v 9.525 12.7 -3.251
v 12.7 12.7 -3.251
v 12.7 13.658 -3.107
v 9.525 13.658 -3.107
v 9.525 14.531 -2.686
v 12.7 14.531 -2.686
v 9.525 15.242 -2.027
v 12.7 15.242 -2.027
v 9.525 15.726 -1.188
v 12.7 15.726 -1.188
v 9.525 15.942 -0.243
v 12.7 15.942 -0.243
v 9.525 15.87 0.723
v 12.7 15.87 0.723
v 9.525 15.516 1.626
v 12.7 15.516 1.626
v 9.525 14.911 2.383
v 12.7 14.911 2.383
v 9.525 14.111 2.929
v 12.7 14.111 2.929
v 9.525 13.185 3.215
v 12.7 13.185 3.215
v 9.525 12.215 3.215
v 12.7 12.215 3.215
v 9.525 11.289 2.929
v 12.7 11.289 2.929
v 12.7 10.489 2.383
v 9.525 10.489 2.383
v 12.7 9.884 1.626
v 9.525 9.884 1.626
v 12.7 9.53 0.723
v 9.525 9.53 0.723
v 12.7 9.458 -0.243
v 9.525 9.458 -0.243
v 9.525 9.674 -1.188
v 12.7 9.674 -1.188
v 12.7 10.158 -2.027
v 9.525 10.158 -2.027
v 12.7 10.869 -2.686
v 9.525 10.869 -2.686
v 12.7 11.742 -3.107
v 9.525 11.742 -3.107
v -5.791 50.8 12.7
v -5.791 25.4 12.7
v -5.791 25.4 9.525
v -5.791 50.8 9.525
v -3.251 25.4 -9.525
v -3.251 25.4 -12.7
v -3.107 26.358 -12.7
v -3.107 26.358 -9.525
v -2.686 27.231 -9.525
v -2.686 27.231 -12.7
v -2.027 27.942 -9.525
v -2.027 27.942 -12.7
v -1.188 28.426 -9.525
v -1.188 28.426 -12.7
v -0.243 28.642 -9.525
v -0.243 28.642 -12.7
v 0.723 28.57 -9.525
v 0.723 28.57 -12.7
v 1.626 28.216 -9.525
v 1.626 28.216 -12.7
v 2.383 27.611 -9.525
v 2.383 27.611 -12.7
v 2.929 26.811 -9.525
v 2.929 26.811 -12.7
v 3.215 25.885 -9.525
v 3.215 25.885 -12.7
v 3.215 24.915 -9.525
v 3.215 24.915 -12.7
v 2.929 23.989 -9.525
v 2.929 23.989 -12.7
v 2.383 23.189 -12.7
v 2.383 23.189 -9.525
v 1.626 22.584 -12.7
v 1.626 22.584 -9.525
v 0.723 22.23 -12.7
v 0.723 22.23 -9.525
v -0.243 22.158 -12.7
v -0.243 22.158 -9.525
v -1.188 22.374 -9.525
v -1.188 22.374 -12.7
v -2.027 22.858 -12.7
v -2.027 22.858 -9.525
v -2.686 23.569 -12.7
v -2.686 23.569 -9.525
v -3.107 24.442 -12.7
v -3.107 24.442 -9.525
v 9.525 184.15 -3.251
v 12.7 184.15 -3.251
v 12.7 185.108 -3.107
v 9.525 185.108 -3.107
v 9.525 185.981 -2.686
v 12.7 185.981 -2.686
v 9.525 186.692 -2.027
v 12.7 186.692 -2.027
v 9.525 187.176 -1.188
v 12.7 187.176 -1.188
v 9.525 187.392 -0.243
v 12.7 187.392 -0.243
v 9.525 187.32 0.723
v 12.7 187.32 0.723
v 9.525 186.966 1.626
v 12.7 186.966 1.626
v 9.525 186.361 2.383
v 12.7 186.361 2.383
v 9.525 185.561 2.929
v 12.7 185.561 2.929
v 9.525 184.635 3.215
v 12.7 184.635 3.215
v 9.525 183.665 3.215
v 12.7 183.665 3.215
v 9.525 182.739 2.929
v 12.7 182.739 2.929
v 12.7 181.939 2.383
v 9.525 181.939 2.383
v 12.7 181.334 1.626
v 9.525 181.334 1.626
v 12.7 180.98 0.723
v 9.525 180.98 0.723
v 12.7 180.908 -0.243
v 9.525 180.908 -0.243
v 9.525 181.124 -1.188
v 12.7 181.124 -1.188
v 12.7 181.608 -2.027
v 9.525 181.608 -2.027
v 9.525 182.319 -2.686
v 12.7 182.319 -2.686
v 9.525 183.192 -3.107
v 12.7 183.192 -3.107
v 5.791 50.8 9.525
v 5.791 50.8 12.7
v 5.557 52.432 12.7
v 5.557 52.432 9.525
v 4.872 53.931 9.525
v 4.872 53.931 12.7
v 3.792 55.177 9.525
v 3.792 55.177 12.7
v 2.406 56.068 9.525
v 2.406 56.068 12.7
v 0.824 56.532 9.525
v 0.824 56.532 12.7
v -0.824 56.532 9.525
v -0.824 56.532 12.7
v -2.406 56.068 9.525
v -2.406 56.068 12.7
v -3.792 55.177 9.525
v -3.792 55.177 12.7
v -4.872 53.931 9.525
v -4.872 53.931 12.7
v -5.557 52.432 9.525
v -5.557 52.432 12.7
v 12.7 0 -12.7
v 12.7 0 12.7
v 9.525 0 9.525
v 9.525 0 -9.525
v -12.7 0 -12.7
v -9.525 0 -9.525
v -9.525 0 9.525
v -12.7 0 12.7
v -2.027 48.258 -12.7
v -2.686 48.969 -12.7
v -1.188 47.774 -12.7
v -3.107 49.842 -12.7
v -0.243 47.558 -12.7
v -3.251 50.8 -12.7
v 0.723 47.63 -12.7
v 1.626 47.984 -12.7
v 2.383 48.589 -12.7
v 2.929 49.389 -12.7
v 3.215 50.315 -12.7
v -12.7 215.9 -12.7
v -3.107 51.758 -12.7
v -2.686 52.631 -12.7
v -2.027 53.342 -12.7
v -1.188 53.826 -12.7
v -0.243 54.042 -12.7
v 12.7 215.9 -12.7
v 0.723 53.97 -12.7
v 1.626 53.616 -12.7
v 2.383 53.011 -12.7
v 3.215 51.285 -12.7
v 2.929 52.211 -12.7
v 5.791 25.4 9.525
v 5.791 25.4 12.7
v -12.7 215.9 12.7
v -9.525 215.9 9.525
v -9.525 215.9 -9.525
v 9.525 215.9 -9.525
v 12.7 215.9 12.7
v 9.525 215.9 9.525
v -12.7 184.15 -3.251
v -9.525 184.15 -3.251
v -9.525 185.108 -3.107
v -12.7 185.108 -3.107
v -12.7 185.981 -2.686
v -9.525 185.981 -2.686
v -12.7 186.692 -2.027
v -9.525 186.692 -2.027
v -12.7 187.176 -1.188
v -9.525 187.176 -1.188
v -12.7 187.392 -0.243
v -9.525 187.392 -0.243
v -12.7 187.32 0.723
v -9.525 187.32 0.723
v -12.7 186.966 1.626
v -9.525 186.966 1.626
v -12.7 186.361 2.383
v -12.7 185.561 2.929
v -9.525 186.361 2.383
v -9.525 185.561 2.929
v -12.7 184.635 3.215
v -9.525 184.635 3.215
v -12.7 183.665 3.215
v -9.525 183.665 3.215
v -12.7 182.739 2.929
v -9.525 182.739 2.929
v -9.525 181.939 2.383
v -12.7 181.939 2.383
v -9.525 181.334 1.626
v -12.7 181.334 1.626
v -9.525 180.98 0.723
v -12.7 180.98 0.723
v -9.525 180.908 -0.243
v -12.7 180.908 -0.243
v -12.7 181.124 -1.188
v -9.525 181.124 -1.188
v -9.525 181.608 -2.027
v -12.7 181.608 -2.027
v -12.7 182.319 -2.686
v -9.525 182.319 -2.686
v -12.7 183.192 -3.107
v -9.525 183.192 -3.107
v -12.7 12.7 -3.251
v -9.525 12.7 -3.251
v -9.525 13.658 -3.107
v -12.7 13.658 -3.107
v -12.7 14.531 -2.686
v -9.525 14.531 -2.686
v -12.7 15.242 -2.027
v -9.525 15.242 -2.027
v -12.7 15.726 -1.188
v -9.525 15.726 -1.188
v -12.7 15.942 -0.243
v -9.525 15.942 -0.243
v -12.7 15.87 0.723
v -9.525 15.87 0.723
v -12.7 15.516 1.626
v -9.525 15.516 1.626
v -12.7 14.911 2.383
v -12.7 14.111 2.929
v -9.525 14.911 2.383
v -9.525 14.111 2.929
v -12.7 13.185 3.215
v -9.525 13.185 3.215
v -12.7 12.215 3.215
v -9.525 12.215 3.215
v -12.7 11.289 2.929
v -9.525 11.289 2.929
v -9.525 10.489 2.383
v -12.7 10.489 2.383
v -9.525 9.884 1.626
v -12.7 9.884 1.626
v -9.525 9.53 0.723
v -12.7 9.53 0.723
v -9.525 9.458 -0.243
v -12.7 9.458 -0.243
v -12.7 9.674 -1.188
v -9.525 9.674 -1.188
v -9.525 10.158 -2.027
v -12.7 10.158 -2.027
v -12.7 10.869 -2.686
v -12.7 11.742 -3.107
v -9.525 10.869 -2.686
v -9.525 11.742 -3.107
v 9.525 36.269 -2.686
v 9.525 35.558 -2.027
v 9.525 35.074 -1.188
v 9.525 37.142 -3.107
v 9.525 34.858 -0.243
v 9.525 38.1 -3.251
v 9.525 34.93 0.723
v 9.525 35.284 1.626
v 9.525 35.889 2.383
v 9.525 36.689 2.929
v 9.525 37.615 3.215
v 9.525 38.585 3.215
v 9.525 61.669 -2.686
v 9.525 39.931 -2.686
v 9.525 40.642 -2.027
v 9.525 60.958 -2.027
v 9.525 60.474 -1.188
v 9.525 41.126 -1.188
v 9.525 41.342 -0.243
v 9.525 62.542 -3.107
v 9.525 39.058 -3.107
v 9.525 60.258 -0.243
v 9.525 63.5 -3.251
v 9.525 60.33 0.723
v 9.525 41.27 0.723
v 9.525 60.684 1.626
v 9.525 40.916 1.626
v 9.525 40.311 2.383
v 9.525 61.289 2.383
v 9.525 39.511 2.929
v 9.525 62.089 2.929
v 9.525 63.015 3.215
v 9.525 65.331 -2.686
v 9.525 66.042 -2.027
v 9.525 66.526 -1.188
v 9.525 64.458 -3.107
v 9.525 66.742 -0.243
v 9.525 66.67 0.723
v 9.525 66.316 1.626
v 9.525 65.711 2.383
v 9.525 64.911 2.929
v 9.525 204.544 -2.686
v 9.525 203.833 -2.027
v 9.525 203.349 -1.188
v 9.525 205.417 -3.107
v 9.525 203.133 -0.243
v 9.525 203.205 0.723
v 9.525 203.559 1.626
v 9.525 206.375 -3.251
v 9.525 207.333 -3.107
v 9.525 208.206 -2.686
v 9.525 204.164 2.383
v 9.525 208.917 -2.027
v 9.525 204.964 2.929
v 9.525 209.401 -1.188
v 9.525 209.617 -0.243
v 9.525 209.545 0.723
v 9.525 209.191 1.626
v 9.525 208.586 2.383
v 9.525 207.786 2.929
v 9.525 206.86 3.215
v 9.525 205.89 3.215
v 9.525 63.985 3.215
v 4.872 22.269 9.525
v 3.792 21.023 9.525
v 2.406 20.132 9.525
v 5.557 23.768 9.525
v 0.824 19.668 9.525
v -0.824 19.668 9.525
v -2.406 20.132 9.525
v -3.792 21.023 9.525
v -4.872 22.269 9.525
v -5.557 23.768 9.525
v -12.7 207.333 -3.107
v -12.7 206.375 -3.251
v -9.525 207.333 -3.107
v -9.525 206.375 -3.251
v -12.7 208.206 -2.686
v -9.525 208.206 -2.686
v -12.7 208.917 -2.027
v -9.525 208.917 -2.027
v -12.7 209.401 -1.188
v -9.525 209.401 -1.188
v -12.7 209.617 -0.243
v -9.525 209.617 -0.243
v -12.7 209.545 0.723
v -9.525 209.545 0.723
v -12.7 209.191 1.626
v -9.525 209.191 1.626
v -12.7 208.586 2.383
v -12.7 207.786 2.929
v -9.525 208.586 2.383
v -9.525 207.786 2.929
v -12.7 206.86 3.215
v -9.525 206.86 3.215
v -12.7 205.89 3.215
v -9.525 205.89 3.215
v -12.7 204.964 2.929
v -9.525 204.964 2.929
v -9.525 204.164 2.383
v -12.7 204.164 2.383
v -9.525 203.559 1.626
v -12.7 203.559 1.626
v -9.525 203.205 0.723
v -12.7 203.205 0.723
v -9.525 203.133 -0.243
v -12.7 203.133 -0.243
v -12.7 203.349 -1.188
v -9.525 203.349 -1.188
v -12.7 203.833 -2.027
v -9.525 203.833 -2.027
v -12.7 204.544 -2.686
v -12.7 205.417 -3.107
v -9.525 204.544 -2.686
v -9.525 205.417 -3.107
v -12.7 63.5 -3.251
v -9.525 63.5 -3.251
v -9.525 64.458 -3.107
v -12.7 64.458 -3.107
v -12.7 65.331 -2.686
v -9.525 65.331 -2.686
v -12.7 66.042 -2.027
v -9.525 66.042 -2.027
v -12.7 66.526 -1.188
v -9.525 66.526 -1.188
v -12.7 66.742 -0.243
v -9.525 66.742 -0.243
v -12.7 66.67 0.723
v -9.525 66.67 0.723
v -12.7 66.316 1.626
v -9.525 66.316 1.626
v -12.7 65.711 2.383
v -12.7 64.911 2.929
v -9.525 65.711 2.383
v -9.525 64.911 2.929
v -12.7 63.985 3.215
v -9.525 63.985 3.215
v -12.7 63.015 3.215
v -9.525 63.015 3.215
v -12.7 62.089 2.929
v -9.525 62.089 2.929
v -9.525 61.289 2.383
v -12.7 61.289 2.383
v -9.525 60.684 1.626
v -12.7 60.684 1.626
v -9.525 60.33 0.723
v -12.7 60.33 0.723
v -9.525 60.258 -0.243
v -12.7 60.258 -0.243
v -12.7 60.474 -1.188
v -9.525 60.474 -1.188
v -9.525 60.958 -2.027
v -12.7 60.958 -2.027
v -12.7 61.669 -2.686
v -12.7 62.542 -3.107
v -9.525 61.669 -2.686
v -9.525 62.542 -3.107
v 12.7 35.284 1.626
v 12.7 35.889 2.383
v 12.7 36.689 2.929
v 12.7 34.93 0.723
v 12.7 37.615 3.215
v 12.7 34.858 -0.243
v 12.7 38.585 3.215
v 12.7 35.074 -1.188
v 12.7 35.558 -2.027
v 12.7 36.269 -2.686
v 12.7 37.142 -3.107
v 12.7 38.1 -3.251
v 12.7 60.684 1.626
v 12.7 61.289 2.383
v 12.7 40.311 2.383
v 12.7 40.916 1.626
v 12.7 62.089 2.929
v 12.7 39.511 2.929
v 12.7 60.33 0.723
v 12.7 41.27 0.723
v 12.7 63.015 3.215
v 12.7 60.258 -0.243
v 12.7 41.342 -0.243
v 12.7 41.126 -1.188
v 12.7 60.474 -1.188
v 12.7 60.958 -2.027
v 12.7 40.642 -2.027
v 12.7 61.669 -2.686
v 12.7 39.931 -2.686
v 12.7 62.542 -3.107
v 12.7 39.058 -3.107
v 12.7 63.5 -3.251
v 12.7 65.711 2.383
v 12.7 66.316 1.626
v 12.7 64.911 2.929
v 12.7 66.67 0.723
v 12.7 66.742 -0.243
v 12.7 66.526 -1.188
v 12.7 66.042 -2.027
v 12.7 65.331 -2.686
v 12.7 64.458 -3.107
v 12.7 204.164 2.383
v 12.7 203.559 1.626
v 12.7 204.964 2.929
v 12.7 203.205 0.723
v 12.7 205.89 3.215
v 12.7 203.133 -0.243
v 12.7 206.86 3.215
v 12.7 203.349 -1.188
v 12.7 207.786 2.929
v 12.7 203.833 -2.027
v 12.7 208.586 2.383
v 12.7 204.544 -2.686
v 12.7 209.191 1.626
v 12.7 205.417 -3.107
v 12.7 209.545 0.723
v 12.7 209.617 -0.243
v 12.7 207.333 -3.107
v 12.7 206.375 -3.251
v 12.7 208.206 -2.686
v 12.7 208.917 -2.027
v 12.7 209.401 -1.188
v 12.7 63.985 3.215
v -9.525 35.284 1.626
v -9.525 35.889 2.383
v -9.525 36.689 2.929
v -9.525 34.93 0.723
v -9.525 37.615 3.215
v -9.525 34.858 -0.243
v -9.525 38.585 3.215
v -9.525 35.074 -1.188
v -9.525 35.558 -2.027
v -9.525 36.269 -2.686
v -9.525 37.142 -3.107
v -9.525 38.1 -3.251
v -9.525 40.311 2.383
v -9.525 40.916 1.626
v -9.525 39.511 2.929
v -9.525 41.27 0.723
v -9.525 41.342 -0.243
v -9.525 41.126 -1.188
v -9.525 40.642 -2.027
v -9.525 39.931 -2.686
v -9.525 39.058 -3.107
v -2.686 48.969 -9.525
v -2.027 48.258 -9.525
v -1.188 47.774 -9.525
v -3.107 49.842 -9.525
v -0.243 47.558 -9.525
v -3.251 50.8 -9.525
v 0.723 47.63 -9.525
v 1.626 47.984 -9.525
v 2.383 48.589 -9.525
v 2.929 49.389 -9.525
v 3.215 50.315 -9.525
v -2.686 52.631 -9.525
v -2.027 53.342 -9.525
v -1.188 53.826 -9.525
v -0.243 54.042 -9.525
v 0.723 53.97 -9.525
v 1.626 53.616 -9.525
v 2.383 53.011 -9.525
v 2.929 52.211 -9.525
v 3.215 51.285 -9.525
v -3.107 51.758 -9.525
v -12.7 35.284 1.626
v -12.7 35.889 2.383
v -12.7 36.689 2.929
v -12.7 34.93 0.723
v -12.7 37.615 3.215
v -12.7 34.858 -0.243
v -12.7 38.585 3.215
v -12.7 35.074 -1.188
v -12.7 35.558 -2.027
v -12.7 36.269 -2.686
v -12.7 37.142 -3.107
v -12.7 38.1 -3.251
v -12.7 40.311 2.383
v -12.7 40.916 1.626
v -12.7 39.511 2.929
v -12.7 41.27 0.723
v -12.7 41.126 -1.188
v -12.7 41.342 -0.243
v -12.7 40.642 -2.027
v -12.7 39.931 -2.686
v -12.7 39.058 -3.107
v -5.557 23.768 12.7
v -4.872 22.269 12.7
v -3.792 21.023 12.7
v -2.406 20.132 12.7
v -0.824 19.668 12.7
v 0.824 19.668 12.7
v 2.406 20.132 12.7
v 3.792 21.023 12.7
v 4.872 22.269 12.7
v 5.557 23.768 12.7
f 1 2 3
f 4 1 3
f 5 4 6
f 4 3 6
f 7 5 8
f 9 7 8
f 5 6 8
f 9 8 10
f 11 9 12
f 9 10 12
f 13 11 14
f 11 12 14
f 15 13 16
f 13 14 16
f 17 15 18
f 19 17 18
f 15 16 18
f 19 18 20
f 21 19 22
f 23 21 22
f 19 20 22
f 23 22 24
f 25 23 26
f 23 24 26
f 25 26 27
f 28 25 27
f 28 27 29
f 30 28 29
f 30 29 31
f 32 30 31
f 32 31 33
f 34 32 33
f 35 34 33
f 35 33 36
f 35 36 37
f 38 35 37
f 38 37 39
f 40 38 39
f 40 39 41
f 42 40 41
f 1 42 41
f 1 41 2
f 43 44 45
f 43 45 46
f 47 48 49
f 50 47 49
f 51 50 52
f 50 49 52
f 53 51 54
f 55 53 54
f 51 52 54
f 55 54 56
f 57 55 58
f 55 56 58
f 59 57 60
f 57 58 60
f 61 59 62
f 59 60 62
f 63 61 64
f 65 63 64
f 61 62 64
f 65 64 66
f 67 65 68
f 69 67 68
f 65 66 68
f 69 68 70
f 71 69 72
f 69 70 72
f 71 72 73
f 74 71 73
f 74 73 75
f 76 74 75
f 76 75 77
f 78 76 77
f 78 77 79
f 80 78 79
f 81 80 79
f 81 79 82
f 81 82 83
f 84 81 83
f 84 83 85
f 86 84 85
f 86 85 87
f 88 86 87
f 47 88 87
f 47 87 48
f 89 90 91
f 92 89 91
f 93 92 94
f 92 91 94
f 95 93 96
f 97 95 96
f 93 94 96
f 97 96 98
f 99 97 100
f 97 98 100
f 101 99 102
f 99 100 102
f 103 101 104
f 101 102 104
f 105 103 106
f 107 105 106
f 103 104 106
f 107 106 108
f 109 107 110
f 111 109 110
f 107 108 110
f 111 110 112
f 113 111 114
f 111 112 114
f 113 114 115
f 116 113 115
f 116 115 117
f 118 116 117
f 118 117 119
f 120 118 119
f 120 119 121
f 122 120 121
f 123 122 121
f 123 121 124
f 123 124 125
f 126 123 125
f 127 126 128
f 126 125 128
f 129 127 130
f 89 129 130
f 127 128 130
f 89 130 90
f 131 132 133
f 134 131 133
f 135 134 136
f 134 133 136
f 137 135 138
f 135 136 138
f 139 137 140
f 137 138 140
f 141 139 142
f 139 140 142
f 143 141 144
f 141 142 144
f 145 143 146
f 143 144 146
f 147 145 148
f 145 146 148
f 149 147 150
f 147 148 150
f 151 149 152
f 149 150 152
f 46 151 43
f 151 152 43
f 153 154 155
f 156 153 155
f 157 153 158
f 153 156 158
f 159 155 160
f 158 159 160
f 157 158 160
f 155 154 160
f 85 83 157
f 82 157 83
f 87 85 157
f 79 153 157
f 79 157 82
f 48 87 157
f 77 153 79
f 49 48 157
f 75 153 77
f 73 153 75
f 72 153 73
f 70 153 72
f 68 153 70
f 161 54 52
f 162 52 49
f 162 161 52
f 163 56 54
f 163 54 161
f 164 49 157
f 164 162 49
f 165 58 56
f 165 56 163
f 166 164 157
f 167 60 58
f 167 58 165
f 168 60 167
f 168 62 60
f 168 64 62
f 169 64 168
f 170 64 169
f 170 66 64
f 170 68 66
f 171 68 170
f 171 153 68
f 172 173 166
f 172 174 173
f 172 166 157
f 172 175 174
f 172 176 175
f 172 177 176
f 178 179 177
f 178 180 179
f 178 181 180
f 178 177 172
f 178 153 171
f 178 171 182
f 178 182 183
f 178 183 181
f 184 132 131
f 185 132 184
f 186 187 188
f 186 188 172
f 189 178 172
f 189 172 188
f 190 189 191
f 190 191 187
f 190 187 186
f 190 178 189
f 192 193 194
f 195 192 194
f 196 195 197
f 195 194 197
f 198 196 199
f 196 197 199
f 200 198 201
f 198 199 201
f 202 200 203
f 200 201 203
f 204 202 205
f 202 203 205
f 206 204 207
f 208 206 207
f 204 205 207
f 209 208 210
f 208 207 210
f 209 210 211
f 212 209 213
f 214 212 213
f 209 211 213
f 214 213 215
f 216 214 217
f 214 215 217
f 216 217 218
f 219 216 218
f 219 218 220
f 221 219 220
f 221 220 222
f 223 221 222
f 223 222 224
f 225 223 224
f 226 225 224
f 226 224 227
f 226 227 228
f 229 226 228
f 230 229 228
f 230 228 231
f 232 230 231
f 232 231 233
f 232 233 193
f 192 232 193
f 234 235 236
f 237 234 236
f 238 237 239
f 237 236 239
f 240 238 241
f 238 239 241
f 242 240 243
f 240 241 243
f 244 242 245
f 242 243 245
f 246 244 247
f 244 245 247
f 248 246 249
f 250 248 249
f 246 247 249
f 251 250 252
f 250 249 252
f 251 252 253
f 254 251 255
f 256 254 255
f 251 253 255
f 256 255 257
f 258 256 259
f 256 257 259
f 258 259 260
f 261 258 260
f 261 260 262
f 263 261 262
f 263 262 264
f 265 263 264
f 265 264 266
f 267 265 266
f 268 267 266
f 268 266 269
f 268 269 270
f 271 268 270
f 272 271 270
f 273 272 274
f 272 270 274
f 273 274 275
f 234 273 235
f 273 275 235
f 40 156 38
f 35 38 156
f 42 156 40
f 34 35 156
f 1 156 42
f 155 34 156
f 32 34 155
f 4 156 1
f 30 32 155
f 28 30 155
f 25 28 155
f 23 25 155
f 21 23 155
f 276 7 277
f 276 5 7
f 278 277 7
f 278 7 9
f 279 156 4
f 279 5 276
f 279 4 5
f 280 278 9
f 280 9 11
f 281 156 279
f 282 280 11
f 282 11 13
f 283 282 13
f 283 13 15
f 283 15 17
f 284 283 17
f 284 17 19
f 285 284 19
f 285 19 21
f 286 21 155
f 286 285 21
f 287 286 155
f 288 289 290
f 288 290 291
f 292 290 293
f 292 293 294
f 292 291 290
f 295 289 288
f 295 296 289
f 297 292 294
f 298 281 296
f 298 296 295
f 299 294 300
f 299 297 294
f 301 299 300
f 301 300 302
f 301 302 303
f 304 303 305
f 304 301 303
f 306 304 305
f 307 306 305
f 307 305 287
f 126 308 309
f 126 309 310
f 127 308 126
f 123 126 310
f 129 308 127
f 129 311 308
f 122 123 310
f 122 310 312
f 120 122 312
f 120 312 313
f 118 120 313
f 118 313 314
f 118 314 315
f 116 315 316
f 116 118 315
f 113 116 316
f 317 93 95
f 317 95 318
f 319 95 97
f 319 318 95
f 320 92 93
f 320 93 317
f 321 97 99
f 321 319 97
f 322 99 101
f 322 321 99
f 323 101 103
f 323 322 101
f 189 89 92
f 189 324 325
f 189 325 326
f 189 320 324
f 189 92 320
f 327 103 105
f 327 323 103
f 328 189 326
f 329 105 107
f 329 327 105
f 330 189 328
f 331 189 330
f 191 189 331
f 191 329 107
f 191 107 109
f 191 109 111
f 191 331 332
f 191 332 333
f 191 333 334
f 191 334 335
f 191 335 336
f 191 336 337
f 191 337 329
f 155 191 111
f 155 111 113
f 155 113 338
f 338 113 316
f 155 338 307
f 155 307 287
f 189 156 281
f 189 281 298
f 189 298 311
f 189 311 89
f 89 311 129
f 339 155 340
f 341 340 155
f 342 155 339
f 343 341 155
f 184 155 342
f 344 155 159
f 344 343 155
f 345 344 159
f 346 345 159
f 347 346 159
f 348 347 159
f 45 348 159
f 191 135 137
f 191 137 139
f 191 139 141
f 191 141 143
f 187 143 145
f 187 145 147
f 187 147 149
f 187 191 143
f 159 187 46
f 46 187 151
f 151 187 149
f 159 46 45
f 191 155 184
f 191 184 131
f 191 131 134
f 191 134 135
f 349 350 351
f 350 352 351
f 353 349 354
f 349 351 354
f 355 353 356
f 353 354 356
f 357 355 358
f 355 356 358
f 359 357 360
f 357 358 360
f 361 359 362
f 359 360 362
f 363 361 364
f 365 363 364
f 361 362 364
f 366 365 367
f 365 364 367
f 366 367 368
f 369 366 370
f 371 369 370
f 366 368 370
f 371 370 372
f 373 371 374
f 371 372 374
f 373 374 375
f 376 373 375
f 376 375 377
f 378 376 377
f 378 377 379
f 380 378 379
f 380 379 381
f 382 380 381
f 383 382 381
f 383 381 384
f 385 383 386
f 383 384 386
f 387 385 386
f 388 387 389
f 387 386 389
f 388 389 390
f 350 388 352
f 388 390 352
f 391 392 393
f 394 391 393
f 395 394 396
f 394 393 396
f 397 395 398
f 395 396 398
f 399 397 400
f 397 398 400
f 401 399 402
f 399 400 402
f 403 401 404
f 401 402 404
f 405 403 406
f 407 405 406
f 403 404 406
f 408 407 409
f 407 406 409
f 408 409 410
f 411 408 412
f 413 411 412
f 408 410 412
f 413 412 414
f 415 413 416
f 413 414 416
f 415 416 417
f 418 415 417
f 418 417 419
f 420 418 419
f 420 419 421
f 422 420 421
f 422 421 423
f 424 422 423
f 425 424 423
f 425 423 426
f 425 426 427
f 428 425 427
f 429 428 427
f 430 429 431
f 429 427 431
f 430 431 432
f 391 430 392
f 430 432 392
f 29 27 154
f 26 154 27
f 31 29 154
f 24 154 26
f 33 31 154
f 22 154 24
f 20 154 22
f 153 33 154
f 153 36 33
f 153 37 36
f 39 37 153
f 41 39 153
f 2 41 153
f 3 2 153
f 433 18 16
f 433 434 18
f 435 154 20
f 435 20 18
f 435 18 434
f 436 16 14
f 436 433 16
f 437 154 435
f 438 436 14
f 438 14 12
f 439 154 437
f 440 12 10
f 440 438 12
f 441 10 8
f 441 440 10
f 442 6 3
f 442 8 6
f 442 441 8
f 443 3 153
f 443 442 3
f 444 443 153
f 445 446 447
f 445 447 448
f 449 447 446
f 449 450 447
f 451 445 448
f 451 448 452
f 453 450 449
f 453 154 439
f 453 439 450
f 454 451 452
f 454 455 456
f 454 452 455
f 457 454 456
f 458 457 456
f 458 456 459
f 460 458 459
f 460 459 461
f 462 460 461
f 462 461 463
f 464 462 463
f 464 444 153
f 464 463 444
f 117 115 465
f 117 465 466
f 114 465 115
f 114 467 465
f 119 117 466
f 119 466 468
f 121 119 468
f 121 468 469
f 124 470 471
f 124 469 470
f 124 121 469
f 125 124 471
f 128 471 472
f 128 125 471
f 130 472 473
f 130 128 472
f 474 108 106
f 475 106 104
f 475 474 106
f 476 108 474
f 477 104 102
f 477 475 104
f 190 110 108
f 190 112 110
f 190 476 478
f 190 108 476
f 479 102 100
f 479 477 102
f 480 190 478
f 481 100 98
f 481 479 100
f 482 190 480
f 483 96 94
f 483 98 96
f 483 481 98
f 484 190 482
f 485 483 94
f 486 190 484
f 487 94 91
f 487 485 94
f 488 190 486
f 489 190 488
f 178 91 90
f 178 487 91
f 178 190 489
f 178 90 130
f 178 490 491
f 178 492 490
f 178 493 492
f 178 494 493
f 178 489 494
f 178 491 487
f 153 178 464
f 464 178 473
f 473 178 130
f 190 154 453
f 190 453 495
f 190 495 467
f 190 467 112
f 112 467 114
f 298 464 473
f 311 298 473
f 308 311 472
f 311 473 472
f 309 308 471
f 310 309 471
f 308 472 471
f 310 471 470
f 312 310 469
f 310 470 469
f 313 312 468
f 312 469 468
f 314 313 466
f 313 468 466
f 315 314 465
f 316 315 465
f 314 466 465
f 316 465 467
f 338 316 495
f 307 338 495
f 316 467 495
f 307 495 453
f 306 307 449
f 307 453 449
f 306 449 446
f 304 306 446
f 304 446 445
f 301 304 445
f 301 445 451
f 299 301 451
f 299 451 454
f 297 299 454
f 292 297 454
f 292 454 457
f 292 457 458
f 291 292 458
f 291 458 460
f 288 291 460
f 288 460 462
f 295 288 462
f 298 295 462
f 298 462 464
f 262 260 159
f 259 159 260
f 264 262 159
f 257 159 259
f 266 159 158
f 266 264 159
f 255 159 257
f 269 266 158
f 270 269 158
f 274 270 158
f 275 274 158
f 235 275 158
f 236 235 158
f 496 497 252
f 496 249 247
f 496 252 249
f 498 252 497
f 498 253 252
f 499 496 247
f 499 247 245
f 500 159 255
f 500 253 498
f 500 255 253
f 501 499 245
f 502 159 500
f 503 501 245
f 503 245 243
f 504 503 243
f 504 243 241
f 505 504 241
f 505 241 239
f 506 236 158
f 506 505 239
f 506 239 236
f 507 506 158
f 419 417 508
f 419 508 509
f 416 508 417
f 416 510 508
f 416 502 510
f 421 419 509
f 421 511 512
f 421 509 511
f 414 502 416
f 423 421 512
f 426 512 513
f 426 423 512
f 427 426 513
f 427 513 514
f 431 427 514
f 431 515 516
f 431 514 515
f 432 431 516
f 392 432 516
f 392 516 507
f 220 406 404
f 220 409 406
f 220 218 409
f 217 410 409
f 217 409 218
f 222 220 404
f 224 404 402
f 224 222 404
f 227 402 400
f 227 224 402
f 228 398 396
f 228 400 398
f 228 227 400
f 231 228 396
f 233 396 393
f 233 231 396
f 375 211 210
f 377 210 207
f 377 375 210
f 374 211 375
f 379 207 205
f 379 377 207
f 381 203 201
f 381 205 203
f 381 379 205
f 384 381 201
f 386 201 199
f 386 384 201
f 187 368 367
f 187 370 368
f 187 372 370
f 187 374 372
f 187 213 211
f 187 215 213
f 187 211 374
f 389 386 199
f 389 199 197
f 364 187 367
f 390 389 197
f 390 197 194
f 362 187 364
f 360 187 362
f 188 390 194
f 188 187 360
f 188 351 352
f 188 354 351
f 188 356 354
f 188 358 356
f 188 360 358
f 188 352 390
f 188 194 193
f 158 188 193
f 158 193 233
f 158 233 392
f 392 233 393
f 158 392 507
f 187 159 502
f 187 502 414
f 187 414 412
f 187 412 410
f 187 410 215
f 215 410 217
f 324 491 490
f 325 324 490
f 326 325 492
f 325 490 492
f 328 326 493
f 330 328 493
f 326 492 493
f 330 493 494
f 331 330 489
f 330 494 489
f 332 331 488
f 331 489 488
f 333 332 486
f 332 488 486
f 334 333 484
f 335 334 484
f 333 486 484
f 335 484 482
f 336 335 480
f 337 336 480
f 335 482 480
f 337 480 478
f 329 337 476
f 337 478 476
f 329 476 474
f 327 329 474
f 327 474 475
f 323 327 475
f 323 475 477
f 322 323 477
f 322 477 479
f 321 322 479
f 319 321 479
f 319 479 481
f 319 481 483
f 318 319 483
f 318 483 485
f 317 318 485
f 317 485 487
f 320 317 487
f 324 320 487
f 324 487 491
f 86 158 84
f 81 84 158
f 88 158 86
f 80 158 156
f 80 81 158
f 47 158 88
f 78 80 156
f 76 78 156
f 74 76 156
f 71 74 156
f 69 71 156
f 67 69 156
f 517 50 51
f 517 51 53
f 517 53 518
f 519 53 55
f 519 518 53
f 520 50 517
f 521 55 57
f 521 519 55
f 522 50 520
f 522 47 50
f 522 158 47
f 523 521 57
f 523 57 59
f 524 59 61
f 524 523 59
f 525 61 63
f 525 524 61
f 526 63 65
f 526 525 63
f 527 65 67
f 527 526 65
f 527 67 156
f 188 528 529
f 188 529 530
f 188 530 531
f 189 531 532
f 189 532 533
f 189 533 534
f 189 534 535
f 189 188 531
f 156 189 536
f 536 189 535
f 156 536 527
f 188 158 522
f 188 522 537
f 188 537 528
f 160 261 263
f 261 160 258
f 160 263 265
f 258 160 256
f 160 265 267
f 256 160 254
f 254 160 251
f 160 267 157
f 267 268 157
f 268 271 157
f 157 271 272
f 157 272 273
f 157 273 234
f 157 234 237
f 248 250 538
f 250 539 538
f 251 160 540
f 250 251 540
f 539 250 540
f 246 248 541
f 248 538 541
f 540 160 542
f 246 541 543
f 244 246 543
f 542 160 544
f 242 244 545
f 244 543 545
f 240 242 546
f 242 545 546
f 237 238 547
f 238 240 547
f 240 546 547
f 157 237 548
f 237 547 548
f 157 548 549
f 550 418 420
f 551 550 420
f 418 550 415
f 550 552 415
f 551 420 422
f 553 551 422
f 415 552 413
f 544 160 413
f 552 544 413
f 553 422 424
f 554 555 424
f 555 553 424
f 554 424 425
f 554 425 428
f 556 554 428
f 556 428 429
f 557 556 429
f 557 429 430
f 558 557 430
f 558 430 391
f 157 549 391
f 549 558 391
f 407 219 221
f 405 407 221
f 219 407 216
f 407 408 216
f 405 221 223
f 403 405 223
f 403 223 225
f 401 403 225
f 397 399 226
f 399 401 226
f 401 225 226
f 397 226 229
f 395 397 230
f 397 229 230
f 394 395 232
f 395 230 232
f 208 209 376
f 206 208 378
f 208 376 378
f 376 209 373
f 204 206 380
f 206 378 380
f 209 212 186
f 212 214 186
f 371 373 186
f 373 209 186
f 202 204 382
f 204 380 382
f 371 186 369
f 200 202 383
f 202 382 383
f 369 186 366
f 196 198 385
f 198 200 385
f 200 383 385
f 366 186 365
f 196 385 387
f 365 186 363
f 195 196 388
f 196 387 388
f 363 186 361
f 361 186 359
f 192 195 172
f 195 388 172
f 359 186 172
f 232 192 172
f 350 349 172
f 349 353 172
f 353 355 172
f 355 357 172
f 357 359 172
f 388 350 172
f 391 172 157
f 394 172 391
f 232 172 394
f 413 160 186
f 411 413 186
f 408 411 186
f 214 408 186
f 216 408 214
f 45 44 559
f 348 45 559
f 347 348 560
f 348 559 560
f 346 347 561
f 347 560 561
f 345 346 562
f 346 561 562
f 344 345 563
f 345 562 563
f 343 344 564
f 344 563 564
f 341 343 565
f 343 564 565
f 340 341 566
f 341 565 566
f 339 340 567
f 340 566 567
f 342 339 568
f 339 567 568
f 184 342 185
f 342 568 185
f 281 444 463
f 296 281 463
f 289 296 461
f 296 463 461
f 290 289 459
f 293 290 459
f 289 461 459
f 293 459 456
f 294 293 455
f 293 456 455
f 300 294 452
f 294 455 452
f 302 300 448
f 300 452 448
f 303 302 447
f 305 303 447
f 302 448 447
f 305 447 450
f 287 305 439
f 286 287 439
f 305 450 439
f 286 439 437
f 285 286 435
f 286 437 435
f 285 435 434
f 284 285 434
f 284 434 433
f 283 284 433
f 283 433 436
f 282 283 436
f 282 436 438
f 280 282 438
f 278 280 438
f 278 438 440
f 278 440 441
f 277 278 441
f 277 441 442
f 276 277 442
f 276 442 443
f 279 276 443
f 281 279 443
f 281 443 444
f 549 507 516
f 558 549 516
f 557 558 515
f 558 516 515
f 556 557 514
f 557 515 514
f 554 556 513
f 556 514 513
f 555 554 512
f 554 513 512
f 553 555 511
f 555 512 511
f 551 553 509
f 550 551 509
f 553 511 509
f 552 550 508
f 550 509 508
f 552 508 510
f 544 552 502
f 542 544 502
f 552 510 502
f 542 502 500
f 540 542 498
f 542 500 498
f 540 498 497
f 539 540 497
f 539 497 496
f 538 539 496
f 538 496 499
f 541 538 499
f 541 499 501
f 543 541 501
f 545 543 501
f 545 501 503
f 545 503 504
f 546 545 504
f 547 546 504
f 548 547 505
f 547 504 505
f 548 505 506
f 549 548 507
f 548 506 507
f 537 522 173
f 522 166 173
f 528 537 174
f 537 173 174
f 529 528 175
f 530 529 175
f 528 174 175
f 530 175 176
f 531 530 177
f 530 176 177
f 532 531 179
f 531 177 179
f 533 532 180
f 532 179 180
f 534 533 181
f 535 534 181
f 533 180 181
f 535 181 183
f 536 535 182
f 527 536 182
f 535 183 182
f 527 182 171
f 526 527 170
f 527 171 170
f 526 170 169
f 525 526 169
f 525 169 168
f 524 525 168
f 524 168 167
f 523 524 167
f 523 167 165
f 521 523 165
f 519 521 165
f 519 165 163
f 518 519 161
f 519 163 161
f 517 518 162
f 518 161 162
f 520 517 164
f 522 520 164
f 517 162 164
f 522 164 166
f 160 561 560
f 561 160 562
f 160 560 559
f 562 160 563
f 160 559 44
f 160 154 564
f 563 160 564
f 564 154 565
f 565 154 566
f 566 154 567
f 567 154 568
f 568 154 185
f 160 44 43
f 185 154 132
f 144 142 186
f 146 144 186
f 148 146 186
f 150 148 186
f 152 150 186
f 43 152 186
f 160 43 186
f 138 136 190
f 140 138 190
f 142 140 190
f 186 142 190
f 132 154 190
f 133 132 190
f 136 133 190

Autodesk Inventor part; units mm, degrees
ref_plane "YZ Plane" through (0, 0, 0) normal (1, 0, 0) x (0, 1, 0)
ref_plane "XZ Plane" through (0, 0, 0) normal (0, 1, 0) x (-1, 0, 0)
ref_plane "XY Plane" through (0, 0, 0) normal (0, 0, 1) x (1, 0, 0)
sketch "Sketch1" plane through (0, 0, 0) normal (0, 1, 0) x (-1, 0, 0)
  line L0 (-12.7, -12.7) -> (12.7, -12.7)
  line L1 (12.7, -12.7) -> (12.7, 12.7)
  line L2 (12.7, 12.7) -> (-12.7, 12.7)
  line L3 (-12.7, 12.7) -> (-12.7, -12.7)
  line L4 (-12.7, -12.7) -> (12.7, 12.7) construction
  line L5 (12.7, -12.7) -> (-12.7, 12.7) construction
  line L6 (9.525, 9.525) -> (9.525, -9.525)
  line L7 (9.525, -9.525) -> (-9.525, -9.525)
  line L8 (-9.525, -9.525) -> (-9.525, 9.525)
  line L9 (-9.525, 9.525) -> (9.525, 9.525)
  point P0 (0, 0)
  dimension "d0" = 25.4
  dimension "d1" = 25.4
  dimension "d2" = 3.175
extrude "Extrusion1" add sketch "Sketch1" along normal blind 201.5942
sketch "Sketch2" plane through (12.7, 0, 12.7) normal (1, 0, 0) x (0, 0, -1)
  line L0 (0, 0) -> (25.4, 0) projected
  line L1 (25.4, 0) -> (25.4, 201.5942) projected
  line L2 (0, 201.5942) -> (25.4, 201.5942) projected
  line L3 (0, 0) -> (0, 201.5942) projected
  line L4 (0, 201.5942) -> (25.4, 188.4235)
  point P0 (12.7, 0)
  dimension "d5" = 27.408
extrude "Extrusion2" [suppressed]
sketch "Sketch3" plane through (12.7, 0, 12.7) normal (1, 0, 0) x (0, 0, -1)
  line L0 (0, 201.5942) -> (0, 215.9)
  line L1 (25.4, 201.5942) -> (25.4, 215.9)
  line L2 (25.4, 215.9) -> (0, 215.9)
  line L3 (25.4, 241.3) -> (0, 241.3) construction
  line L4 (0, 241.3) -> (0, 215.9) construction
  line L5 (0, 215.9) -> (25.4, 215.9) construction
  line L6 (25.4, 215.9) -> (25.4, 241.3) construction
  line L7 (25.4, 241.3) -> (0, 215.9) construction
  line L8 (0, 241.3) -> (25.4, 215.9) construction
  circle A0 centre (12.7, 206.375) radius 3.2512
  circle A1 centre (12.7, 228.6) radius 2.4892 construction
  circle A2 centre (12.7, 184.15) radius 3.2512
  line L9 (0, 201.5942) -> (25.4, 201.5942)
  point P0 (12.7, 0)
  dimension "d8" = 14.3058
  dimension "d9" = 25.4
  dimension "d10" = 25.4
  dimension "d11" = 6.5024
  dimension "d12" = 4.9784
  dimension "d13" = 22.225
  dimension "d14" = 22.225
extrude "Extrusion3" cut sketch "Sketch3" against normal through all contours A2
sketch "Sketch4" plane through (12.7, 0, -12.7) normal (0, 0, -1) x (-1, 0, 0)
  circle A0 centre (12.7, 25.4) radius 3.2512
  circle A1 centre (12.7, 50.8) radius 3.2512
  line L0 (0, 0) -> (25.4, 0) projected
  point P0 (12.7, 0)
  point P1 (12.7, 0)
  point P2 (12.7, 0)
  dimension "d17" = 6.5024
  dimension "d18" = 6.5024
  dimension "d19" = 25.4
  dimension "d20" = 25.4
extrude "Extrusion4" cut sketch "Sketch4" against normal blind 25.4
sketch "Sketch5" plane through (-12.7, 0, 12.7) normal (0, 0, 1) x (1, 0, 0)
  circle A0 centre (12.7, 25.4) radius 3.2512 construction
  circle A1 centre (12.7, 50.8) radius 3.2512 construction
  line L0 (15.9512, 25.4) -> (15.9512, 50.8) construction
  line L1 (9.4488, 25.4) -> (9.4488, 50.8) construction
  arc A2 (9.4488, 25.4) -> (15.9512, 25.4) centre (12.7, 25.4) ccw construction
  arc A3 (15.9512, 50.8) -> (9.4488, 50.8) centre (12.7, 50.8) ccw construction
  line L2 (18.4912, 50.8) -> (18.4912, 25.4)
  arc A4 (6.9088, 25.4) -> (18.4912, 25.4) centre (12.7, 25.4) ccw
  line L3 (6.9088, 25.4) -> (6.9088, 50.8)
  arc A5 (18.4912, 50.8) -> (6.9088, 50.8) centre (12.7, 50.8) ccw
  point P0 (12.7, 0)
  dimension "d26" = 2.54
extrude "Extrusion5" cut sketch "Sketch5" against normal blind 3.175
sketch "Sketch6" plane through (12.7, 0, 12.7) normal (1, 0, 0) x (0, 0, -1)
  line L0 (12.7, 0) -> (12.7, 6.5024)
  circle A0 centre (12.7, -12.7) radius 3.2512
  line L1 (0, 0) -> (25.4, 0) projected
  circle A1 centre (12.7, 12.7) radius 3.2512
  circle A2 centre (12.7, 38.1) radius 3.2512
  circle A3 centre (12.7, 63.5) radius 3.2512
  line L2 (12.7, -12.7) -> (12.7, 63.5) construction
  dimension "d27" = 6.5024
  dimension "d31" = 25.4
  dimension "d38" = 6.5024
  dimension "d39" = 12.7
extrude "Extrusion6" cut sketch "Sketch6" against normal blind 25.4 contours A1 | A2 | A3
extrude "Extrusion7" add sketch "Sketch3" against normal blind 25.4 contours L0 L2 L1 L9
sketch "Sketch7" plane through (12.7, 215.9, 12.7) normal (0, 1, 0) x (1, 0, 0)
  line L0 (0, 25.4) -> (0, 0) projected
  line L1 (0, 25.4) -> (-25.4, 25.4) projected
  line L2 (-25.4, 0) -> (-25.4, 25.4) projected
  line L3 (0, 0) -> (-25.4, 0) projected
  line L4 (-22.225, 22.225) -> (-3.175, 22.225)
  line L5 (-3.175, 22.225) -> (-3.175, 3.175)
  line L6 (-3.175, 3.175) -> (-22.225, 3.175)
  line L7 (-22.225, 3.175) -> (-22.225, 22.225)
  point P0 (-12.7, 12.7)
  dimension "d42" = 3.175
extrude "Extrusion8" cut sketch "Sketch7" against normal blind 25.4 contours L4 L5 L6 L7
properties part number "STRU_014_BilletPole_9in_Angled" material "Aluminum 6061"
